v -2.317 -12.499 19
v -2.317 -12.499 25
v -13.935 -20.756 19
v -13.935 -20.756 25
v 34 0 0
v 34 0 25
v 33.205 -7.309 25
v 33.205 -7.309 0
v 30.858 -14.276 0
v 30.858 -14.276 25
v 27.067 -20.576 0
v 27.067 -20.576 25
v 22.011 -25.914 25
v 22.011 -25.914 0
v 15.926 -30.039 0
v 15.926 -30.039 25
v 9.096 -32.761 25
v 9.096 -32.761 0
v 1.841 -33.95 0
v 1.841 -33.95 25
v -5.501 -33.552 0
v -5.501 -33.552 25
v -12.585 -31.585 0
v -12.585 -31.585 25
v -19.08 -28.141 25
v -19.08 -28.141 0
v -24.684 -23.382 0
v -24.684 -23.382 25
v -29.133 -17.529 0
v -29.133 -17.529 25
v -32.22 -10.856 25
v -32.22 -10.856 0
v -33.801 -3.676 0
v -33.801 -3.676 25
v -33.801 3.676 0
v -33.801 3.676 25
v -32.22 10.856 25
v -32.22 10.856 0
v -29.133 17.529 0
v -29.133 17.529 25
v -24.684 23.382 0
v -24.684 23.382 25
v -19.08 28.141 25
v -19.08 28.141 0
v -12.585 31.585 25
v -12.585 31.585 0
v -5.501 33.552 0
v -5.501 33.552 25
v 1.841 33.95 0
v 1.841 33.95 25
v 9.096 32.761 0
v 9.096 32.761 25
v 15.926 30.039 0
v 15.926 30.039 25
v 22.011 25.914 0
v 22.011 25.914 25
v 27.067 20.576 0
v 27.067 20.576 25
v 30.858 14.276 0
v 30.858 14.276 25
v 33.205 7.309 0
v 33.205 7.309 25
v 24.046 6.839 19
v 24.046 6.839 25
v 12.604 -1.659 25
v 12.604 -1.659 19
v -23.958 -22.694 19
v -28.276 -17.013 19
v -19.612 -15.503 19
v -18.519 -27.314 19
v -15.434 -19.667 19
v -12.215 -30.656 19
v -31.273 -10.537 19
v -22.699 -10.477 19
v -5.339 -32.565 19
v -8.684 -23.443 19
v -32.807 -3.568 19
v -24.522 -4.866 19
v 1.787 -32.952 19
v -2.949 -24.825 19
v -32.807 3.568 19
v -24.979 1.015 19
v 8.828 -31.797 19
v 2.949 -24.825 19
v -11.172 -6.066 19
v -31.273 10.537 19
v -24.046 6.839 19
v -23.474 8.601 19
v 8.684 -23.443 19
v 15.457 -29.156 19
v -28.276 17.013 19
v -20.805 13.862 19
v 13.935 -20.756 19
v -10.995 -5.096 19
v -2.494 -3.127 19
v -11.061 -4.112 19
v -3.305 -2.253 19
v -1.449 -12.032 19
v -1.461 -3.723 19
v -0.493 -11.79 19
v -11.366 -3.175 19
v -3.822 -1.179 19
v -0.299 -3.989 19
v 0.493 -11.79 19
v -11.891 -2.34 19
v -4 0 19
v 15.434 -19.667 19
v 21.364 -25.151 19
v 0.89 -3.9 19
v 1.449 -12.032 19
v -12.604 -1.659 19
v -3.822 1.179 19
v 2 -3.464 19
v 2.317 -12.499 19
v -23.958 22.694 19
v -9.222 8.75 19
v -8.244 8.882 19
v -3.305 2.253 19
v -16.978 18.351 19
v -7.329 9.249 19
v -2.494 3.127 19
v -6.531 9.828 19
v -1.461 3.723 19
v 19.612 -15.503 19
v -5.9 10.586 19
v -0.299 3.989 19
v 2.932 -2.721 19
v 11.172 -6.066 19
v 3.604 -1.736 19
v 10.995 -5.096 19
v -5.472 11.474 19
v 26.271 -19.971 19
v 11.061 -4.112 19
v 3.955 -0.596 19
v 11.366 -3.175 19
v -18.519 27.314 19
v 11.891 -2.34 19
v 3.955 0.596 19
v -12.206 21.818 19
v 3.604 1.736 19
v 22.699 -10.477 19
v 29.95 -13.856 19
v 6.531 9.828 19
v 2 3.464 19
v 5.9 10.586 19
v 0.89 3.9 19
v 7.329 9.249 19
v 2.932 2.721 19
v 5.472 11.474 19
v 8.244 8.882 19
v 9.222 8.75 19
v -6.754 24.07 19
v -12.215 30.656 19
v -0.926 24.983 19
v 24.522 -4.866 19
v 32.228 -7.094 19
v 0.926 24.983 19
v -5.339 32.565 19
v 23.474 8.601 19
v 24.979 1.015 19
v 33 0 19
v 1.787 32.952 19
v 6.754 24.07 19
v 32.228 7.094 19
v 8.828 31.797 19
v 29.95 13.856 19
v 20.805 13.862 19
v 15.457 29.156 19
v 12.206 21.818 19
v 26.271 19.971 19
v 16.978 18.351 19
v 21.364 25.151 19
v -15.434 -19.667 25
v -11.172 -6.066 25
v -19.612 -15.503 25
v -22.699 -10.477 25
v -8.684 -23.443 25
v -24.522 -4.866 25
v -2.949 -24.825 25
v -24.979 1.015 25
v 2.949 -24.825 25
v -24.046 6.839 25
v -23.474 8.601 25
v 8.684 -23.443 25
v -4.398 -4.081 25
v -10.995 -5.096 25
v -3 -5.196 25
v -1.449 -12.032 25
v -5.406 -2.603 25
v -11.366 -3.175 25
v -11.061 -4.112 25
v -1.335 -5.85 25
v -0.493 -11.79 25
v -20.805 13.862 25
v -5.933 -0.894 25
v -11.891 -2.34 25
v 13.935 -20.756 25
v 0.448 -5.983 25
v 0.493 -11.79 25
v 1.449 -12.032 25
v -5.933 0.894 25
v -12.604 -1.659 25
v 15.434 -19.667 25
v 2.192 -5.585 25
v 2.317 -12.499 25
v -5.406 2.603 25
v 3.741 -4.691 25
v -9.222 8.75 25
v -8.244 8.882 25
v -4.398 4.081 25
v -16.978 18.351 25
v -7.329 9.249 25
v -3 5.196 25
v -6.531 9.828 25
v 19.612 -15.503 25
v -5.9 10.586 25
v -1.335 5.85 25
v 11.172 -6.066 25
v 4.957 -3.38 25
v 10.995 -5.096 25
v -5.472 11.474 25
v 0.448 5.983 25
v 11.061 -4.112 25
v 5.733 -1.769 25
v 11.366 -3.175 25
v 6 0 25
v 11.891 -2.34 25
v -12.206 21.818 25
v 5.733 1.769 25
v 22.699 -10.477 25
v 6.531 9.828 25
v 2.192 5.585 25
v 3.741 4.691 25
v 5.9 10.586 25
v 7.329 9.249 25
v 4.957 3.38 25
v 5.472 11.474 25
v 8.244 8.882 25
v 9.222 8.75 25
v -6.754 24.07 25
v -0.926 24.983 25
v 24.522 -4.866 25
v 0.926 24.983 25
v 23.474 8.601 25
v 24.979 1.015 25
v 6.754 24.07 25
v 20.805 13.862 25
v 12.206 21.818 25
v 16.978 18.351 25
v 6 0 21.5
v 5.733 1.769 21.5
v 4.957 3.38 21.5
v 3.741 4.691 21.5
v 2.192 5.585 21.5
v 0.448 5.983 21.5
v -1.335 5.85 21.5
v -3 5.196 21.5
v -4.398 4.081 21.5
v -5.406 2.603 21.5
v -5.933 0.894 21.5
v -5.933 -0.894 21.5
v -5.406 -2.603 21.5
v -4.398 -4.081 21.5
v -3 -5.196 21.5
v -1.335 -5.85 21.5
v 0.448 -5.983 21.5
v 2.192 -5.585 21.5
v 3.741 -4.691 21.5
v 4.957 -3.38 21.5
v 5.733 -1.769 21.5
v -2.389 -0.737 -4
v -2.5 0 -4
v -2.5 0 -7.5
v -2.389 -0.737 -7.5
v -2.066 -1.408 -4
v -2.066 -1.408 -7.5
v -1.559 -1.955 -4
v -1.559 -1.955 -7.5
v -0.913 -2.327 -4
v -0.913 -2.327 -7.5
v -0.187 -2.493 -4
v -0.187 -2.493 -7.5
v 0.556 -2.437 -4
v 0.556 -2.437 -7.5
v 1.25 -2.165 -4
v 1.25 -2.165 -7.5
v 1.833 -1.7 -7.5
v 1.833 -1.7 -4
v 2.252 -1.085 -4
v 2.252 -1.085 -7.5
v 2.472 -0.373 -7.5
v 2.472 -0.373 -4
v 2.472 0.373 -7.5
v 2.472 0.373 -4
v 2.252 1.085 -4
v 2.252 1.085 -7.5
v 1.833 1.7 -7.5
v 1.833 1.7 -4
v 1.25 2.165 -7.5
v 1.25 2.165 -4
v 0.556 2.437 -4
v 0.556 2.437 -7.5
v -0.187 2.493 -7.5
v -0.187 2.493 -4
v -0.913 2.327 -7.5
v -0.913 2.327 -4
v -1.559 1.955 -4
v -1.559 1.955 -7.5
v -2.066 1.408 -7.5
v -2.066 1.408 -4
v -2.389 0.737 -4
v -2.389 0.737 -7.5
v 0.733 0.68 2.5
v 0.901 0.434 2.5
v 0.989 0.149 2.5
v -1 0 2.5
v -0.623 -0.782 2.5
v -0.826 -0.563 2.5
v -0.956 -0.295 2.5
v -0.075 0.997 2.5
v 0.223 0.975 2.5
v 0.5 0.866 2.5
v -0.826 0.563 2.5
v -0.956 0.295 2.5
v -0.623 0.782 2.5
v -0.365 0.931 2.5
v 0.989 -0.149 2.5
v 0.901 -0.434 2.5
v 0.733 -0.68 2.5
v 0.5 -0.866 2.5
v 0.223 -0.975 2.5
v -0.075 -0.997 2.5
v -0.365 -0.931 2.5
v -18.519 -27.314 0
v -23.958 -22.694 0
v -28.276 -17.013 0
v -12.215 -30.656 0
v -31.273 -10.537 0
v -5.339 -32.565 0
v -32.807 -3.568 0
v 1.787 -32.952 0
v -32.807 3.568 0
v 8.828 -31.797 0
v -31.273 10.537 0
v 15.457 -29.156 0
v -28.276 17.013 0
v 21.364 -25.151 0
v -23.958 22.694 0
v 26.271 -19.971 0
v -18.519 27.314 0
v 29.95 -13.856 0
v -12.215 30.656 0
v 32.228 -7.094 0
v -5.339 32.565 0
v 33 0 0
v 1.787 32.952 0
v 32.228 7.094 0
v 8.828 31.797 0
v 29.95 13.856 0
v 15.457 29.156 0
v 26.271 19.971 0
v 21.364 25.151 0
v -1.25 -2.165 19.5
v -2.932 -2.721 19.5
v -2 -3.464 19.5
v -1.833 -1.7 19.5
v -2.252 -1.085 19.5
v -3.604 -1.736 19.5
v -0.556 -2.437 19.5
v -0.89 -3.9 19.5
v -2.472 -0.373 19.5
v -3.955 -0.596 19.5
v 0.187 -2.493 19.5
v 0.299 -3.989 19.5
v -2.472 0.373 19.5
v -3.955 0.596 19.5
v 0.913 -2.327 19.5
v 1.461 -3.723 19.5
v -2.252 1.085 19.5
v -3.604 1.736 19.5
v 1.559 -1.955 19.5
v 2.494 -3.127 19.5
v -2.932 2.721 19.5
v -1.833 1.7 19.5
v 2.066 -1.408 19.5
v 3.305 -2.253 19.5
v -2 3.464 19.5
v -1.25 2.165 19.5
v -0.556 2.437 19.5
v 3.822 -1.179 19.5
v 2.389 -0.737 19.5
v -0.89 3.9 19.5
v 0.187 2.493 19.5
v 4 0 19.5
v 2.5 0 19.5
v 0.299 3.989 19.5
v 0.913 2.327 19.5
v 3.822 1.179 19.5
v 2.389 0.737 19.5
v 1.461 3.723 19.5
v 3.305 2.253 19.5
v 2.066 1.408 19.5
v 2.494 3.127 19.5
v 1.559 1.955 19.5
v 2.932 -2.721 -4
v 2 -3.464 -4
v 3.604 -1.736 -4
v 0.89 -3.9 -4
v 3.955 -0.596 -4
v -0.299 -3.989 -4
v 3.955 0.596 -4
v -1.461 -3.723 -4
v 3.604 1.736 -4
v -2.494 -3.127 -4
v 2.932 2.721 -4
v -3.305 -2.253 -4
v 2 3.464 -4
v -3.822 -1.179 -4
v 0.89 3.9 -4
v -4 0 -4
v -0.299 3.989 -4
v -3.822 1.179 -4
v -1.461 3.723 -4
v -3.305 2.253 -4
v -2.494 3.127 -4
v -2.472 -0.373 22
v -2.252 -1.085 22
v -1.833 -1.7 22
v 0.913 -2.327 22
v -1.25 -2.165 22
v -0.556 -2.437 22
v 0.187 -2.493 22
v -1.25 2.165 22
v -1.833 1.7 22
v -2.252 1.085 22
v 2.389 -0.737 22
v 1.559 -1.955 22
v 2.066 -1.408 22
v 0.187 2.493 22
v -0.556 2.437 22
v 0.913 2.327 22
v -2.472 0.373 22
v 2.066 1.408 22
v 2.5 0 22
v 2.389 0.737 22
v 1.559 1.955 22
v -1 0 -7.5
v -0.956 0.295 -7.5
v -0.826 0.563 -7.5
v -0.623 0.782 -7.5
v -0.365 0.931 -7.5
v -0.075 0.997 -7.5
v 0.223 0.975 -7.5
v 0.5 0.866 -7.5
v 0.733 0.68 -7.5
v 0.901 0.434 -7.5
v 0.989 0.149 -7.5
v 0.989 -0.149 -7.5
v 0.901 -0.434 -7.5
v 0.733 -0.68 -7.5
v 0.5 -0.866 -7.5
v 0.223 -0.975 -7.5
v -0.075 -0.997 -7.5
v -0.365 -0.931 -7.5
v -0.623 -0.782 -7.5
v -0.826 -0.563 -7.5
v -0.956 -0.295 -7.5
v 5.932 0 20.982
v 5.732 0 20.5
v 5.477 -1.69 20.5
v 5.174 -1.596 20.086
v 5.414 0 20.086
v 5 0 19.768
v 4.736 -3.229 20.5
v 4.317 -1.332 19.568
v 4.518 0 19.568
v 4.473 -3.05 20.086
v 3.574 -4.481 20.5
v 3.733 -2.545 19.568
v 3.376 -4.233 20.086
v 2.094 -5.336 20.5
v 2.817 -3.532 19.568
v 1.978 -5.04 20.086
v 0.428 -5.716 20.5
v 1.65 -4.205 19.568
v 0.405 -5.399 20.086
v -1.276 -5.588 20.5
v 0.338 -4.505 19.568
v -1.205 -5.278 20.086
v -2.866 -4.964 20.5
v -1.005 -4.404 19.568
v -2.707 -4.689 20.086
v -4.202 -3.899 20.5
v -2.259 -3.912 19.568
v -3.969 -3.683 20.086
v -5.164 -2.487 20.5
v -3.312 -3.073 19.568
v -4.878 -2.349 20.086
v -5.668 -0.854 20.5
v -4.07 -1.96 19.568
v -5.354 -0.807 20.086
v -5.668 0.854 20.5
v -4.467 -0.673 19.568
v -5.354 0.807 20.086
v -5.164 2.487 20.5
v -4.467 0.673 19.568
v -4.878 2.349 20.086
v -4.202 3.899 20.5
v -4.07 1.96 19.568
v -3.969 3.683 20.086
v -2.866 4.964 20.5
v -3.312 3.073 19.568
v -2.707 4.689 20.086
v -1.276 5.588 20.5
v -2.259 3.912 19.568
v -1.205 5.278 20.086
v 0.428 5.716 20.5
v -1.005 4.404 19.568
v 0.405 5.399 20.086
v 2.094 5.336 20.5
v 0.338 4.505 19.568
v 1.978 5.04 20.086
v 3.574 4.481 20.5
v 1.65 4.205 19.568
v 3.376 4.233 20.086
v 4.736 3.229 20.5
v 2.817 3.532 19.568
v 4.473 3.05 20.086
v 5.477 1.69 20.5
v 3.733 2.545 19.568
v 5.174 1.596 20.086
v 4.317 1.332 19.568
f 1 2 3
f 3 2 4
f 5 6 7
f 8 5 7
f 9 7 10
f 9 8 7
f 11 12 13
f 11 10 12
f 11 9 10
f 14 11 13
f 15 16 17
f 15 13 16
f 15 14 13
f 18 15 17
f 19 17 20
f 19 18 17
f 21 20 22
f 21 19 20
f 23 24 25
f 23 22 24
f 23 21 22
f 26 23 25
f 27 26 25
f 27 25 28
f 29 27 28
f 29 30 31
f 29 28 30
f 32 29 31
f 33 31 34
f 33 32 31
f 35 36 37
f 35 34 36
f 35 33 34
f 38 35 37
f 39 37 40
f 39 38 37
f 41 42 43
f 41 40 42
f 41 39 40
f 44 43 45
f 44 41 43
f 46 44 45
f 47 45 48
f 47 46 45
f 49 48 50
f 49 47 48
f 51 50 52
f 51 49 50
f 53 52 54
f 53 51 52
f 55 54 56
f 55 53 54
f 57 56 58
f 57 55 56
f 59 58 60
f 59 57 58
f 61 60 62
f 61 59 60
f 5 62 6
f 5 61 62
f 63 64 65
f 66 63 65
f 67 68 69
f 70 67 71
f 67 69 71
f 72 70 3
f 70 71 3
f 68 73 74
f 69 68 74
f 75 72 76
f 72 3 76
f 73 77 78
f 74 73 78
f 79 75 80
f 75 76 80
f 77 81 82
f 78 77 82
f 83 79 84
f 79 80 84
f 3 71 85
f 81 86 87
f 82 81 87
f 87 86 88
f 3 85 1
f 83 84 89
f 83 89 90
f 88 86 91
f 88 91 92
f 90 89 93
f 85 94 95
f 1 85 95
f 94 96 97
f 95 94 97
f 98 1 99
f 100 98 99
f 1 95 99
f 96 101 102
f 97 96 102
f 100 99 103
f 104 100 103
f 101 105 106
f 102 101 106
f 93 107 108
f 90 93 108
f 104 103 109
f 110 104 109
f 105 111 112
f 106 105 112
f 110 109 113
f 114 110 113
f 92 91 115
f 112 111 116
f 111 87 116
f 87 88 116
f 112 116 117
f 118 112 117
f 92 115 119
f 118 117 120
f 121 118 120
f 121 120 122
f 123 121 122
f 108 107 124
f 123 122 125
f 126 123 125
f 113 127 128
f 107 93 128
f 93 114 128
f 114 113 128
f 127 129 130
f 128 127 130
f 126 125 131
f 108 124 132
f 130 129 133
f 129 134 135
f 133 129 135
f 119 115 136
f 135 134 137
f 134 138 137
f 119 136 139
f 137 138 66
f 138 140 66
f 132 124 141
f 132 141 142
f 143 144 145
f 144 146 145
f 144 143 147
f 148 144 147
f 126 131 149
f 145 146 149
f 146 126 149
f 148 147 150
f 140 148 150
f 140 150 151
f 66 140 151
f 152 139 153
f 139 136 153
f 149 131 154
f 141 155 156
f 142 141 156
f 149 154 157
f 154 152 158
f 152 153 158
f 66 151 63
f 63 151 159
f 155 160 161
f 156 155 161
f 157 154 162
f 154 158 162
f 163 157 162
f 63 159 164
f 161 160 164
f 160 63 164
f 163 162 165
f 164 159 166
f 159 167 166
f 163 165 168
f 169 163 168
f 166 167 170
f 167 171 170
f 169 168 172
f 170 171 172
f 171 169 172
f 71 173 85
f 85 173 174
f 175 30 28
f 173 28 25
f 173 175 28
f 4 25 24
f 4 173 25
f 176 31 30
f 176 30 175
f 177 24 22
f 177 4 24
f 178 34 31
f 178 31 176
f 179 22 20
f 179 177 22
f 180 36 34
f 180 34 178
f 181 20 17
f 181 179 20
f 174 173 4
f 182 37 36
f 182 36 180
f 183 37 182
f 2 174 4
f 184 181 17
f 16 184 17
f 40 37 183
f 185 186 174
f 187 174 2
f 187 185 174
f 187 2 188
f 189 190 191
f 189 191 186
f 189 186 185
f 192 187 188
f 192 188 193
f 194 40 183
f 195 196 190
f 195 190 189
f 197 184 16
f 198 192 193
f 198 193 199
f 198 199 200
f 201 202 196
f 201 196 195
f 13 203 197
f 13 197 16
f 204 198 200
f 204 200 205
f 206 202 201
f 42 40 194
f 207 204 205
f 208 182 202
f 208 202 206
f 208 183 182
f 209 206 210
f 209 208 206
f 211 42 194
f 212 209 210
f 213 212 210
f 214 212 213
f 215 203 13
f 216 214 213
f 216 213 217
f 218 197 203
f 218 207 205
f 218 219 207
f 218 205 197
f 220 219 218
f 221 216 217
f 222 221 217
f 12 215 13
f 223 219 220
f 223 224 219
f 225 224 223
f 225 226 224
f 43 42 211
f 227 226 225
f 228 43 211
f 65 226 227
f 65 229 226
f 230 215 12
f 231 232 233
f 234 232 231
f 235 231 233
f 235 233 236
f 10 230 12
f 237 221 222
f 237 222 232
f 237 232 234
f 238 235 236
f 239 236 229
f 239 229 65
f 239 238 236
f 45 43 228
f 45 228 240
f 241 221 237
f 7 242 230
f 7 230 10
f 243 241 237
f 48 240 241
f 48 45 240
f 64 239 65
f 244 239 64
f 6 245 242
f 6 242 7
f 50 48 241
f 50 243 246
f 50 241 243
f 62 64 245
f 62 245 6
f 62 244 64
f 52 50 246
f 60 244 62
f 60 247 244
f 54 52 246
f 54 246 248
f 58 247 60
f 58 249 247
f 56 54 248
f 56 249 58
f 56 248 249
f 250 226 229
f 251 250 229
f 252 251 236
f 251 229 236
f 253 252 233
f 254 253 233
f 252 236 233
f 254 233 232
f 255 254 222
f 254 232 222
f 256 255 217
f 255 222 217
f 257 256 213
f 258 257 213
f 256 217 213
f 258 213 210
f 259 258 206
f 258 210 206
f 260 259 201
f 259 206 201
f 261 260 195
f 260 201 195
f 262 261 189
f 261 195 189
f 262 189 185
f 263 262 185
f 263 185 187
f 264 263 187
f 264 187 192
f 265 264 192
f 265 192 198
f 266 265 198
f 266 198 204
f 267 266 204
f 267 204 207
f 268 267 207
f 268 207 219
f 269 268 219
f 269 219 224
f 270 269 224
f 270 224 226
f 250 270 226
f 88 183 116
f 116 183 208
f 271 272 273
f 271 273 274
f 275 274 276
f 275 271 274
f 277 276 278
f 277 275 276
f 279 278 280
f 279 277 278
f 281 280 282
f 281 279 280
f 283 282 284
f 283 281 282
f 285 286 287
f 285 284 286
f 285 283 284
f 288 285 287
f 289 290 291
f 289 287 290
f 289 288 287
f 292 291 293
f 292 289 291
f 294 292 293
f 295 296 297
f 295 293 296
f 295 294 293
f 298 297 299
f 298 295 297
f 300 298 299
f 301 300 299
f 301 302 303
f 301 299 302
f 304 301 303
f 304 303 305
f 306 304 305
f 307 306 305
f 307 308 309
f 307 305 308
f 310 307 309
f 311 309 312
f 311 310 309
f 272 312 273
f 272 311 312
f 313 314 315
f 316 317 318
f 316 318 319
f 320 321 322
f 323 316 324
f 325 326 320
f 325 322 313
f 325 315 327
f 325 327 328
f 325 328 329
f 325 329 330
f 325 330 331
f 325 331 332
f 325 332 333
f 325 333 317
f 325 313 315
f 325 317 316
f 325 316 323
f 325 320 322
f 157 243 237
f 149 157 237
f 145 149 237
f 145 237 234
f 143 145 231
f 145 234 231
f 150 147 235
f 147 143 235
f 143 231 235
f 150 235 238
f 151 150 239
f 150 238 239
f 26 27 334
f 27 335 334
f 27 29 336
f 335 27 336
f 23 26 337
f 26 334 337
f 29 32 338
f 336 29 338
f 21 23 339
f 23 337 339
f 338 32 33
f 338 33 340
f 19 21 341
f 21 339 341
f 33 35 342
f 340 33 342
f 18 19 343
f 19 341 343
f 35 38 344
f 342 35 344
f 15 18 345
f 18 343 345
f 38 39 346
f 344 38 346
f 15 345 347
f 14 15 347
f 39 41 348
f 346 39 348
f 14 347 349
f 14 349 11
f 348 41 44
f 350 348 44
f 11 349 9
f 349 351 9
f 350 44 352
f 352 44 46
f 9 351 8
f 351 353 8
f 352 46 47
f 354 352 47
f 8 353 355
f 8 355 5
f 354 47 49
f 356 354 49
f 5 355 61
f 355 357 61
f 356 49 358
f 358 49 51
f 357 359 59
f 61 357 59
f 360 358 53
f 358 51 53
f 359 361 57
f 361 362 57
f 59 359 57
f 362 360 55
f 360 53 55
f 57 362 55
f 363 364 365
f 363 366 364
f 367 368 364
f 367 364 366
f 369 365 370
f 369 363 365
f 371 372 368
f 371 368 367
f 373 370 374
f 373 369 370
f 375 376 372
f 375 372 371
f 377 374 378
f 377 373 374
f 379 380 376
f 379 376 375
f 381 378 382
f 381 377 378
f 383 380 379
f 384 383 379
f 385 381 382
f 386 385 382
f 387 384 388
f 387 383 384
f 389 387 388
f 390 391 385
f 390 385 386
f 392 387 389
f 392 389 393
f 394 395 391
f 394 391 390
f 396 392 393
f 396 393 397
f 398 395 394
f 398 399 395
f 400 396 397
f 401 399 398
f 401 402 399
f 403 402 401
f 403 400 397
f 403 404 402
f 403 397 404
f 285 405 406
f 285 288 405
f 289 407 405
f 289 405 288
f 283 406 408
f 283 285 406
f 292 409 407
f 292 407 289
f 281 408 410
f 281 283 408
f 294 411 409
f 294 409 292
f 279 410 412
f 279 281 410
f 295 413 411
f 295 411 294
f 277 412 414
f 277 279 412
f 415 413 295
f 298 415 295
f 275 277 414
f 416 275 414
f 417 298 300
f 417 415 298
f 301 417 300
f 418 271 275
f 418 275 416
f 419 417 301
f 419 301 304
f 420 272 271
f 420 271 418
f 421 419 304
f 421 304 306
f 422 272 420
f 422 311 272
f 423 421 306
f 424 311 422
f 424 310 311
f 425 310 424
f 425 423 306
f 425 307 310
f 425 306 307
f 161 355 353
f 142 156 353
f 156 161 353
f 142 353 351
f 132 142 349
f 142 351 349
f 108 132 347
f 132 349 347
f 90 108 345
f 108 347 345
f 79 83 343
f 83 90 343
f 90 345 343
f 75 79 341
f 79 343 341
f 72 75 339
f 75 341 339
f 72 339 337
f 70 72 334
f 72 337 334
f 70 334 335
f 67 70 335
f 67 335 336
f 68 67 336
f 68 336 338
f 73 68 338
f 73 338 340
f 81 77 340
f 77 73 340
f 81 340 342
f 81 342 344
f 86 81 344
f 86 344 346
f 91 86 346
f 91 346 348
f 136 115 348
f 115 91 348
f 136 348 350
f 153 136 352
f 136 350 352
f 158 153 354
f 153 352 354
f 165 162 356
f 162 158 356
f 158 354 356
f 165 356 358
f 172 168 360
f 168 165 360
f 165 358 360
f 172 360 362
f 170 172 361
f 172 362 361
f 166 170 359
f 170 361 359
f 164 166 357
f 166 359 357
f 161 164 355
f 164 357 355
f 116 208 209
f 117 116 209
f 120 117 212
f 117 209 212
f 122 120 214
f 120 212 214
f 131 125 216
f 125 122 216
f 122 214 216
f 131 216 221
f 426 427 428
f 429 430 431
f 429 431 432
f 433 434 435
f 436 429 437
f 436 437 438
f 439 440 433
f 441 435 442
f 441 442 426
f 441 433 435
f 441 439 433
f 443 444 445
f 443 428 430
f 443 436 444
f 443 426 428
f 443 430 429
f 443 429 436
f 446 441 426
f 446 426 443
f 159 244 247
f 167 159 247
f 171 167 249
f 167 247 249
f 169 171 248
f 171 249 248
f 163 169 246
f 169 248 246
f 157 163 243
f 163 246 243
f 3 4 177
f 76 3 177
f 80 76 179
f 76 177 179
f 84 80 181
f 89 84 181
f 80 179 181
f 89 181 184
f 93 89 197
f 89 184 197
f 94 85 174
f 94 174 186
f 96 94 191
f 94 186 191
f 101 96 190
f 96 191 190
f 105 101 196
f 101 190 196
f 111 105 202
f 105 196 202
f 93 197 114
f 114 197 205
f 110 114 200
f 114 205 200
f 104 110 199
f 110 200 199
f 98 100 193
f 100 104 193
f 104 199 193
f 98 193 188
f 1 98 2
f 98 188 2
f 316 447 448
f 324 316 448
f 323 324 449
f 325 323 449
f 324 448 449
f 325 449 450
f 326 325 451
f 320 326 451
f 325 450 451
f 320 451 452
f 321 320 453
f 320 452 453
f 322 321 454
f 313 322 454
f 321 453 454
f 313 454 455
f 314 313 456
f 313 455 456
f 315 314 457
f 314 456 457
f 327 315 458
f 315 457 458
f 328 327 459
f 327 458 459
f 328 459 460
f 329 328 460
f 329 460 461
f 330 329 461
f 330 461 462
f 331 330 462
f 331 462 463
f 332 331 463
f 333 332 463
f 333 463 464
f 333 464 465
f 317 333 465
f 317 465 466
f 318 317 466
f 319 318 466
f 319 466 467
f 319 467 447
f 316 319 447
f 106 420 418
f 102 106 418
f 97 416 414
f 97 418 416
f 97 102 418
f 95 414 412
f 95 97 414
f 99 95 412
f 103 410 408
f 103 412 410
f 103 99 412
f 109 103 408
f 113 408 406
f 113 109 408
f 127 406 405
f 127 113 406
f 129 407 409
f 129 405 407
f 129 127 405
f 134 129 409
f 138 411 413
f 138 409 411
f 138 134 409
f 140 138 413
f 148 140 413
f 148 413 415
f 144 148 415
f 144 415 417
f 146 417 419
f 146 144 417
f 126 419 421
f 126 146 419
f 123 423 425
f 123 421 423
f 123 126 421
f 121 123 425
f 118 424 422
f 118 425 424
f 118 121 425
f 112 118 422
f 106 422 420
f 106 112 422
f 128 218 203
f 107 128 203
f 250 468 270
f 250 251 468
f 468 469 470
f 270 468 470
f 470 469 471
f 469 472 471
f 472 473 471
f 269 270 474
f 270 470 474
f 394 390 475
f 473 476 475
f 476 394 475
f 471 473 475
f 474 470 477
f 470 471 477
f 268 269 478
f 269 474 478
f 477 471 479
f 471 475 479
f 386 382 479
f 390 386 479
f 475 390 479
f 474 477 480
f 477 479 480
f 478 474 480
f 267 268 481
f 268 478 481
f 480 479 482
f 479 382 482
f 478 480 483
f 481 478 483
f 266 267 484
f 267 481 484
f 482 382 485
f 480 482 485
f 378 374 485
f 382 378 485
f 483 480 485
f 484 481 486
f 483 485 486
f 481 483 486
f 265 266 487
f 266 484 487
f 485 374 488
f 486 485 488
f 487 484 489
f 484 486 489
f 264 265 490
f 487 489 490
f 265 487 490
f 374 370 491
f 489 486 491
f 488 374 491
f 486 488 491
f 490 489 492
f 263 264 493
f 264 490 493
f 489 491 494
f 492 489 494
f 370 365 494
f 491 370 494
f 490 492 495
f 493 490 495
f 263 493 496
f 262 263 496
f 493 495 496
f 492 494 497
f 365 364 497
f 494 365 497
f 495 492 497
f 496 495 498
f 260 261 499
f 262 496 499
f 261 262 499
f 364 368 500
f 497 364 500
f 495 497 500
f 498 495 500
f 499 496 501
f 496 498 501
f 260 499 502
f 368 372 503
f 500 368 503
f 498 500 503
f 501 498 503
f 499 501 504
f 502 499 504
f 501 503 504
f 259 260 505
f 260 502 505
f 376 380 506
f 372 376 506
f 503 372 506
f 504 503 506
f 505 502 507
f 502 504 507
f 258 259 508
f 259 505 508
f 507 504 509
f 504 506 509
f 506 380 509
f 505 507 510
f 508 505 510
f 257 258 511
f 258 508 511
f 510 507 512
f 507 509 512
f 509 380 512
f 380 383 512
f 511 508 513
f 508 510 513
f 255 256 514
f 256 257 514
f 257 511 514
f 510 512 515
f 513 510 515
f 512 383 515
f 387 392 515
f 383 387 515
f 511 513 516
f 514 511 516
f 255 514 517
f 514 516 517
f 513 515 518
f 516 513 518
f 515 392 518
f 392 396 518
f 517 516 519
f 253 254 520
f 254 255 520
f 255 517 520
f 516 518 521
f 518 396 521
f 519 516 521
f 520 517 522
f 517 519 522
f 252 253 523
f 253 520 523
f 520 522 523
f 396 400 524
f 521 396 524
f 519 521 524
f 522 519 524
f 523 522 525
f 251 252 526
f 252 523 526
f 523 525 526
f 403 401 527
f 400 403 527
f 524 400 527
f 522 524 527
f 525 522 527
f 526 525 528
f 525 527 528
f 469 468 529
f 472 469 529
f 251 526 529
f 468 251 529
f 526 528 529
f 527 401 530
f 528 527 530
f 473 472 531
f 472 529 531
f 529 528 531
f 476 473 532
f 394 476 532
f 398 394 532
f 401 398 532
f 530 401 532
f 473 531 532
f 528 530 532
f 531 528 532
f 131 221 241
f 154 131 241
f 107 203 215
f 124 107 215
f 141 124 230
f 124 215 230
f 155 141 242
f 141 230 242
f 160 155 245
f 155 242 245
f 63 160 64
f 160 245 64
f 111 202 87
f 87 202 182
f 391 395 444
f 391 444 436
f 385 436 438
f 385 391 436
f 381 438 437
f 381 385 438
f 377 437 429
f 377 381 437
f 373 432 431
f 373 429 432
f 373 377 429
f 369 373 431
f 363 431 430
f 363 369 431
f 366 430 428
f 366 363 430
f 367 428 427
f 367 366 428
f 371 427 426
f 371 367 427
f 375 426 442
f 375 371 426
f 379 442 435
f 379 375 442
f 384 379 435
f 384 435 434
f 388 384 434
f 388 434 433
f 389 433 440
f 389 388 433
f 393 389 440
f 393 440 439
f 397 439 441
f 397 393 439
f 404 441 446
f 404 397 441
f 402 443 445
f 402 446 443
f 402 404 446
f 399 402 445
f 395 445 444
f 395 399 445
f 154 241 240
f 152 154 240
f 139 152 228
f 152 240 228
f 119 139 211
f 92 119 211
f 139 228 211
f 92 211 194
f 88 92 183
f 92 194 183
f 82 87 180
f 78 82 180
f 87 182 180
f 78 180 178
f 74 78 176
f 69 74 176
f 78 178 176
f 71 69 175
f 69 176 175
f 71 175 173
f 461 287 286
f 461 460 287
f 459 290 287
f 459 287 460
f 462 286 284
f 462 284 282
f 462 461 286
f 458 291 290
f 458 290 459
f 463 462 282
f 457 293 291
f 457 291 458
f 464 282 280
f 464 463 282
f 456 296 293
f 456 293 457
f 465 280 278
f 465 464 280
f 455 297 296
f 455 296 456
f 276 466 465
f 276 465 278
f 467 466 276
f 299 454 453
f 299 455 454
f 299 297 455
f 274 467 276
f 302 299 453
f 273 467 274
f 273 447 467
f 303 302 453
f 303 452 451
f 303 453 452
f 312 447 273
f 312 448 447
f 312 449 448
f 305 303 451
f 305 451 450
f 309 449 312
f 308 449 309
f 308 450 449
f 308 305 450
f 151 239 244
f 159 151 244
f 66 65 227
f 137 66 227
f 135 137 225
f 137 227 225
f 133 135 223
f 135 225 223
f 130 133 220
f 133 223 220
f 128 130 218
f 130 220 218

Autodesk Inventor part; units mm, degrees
ref_plane "YZ Plane" through (0, 0, 0) normal (1, 0, 0) x (0, 1, 0)
ref_plane "XZ Plane" through (0, 0, 0) normal (0, 1, 0) x (-1, 0, 0)
ref_plane "XY Plane" through (0, 0, 0) normal (0, 0, 1) x (1, 0, 0)
sketch "Эскиз1" plane through (0, 0, 0) normal (0, 0, 1) x (1, 0, 0)
  circle A0 centre (0, 0) radius 34
  circle A1 centre (0, 0) radius 33
  dimension "d0" = 68
  dimension "d1" = 66
extrude "Выдавливание1" add sketch "Эскиз1" along normal blind 25
sketch "Эскиз4" plane through (0, 0, 25) normal (0, 0, 1) x (1, 0, 0)
  circle A0 centre (0, 0) radius 33
extrude "Выдавливание2" add sketch "Эскиз4" against normal blind 6
sketch "Эскиз5" plane through (0, 0, 25) normal (0, 0, 1) x (1, 0, 0)
  circle A0 centre (0, 0) radius 25
  line L0 (0, 25) -> (23.7764, 7.7254)
  line L1 (23.7764, 7.7254) -> (14.6946, -20.2254)
  line L2 (14.6946, -20.2254) -> (-14.6946, -20.2254)
  line L3 (-14.6946, -20.2254) -> (-23.7764, 7.7254)
  line L4 (-23.7764, 7.7254) -> (0, 25)
  circle A1 centre (0, 0) radius 11
  line L5 (0, 25) -> (-4.9275, 9.8346)
  line L6 (0, 25) -> (4.9275, 9.8346)
  line L7 (23.7764, 7.7254) -> (7.8306, 7.7254)
  line L8 (23.7764, 7.7254) -> (10.876, -1.6473)
  line L9 (14.6946, -20.2254) -> (9.7671, -5.06)
  line L10 (14.6946, -20.2254) -> (1.7942, -10.8527)
  line L11 (-14.6946, -20.2254) -> (-1.7942, -10.8527)
  line L12 (-14.6946, -20.2254) -> (-9.7671, -5.06)
  line L13 (-7.8306, 7.7254) -> (-23.7764, 7.7254)
  line L14 (-10.876, -1.6473) -> (-23.7764, 7.7254)
  line L15 (4.9275, 9.8346) -> (9.7671, -5.06)
  line L16 (10.876, -1.6473) -> (-1.7942, -10.8527)
  line L17 (1.7942, -10.8527) -> (-10.876, -1.6473)
  line L18 (-9.7671, -5.06) -> (-4.9275, 9.8346)
  line L19 (-7.8306, 7.7254) -> (7.8306, 7.7254)
  line L20 (-7.8306, 7.7254) -> (-4.9275, 9.8346)
  line L21 (-6.3791, 8.78) -> (0, 27.7353)
  line L22 (4.9275, 9.8346) -> (7.8306, 7.7254)
  line L23 (10.876, -1.6473) -> (9.7671, -5.06)
  line L24 (1.7942, -10.8527) -> (-1.7942, -10.8527)
  line L25 (-9.7671, -5.06) -> (-10.876, -1.6473)
  line L26 (0, 27.7353) -> (6.3791, 8.78)
  line L27 (-10.3215, -3.3537) -> (-26.3778, 8.5707)
  line L28 (-26.3778, 8.5707) -> (-6.3791, 8.78)
  line L29 (0, -10.8527) -> (-16.3024, -22.4383)
  line L30 (-16.3024, -22.4383) -> (-10.3215, -3.3537)
  line L31 (10.3215, -3.3537) -> (16.3024, -22.4383)
  line L32 (16.3024, -22.4383) -> (0, -10.8527)
  line L33 (6.3791, 8.78) -> (26.3778, 8.5707)
  line L34 (26.3778, 8.5707) -> (10.3215, -3.3537)
  point P0 (23.7764, 7.7254)
  point P1 (23.7764, 7.7254)
  point P2 (-15.4339, -19.6671)
  point P3 (-10.3966, -3.5932)
  point P4 (-10.523, -3.204)
  point P5 (-24.0463, 6.8392)
  point P6 (0.2046, -10.9981)
  point P7 (-0.2046, -10.9981)
  point P8 (-13.9352, -20.756)
  point P9 (13.9352, -20.756)
  point P10 (10.523, -3.204)
  point P11 (10.3966, -3.5932)
  point P12 (15.4339, -19.6671)
  point P13 (24.0463, 6.8392)
  point P14 (23.4738, 8.6011)
  point P15 (0.9263, 24.9828)
  point P16 (6.299, 9.0179)
  point P17 (6.63, 8.7774)
  point P18 (-23.4738, 8.6011)
  point P19 (-6.63, 8.7774)
  point P20 (-6.299, 9.0179)
  point P21 (-0.9263, 24.9828)
  dimension "d8" = 22
  dimension "d7" = 50
  dimension "d15" = 360
extrude "Выдавливание3" cut sketch "Эскиз5" against normal through all contours A0 L31 L1 L34 | L1 L31 A1 L34 | L33 L0 L26 A0 | L33 A1 L26 L0 | A0 L29 L2 L32 | L2 L29 A1 L32 | L21 L4 L28 A0 | L21 A1 L28 L4 | A0 L27 L3 L30 | L3 L27 A1 L30
fillet "Сопряжение1" radius 4 10 edges at (6.299, 9.0179, 22) (6.63, 8.7774, 22) (10.523, -3.204, 22) (10.3966, -3.5932, 22) (0.2046, -10.9981, 22) (-0.2046, -10.9981, 22) (-10.523, -3.204, 22) (-10.3966, -3.5932, 22) (-6.299, 9.0179, 22) (-6.63, 8.7774, 22)
sketch "Эскиз6" plane through (0, 0, 25) normal (0, 0, 1) x (1, 0, 0)
  circle A0 centre (0, 0) radius 6
  dimension "d18" = 12
extrude "Выдавливание4" cut sketch "Эскиз6" against normal blind 5.5
sketch "Эскиз7" plane through (0, 0, 19.5) normal (0, 0, 1) x (1, 0, 0)
  circle A0 centre (0, 0) radius 2.5
  dimension "d21" = 5
extrude "Выдавливание5" add sketch "Эскиз7" along normal blind 2.5
fillet "Сопряжение2" radius 2 1 edges at (-6, 0, 19.5)
sketch "Эскиз8" plane through (0, 0, 19) normal (0, 0, -1) x (-1, 0, 0)
  circle A0 centre (0, 0) radius 4 projected
  circle A1 centre (0, 0) radius 4.5
  dimension "d25" = 9
extrude "Выдавливание6" add sketch "Эскиз8" along normal blind 23 contours A0
sketch "Эскиз9" plane through (0, 0, -4) normal (0, 0, -1) x (-1, 0, 0)
  circle A0 centre (0, 0) radius 2.5
  dimension "d28" = 5
extrude "Выдавливание7" add sketch "Эскиз9" along normal blind 3.5
sketch "Эскиз10" plane through (0, 0, -7.5) normal (0, 0, -1) x (-1, 0, 0)
  circle A0 centre (0, 0) radius 1
  dimension "d31" = 2
extrude "Выдавливание8" cut sketch "Эскиз10" against normal blind 10
properties part number "Колесо красивое"
